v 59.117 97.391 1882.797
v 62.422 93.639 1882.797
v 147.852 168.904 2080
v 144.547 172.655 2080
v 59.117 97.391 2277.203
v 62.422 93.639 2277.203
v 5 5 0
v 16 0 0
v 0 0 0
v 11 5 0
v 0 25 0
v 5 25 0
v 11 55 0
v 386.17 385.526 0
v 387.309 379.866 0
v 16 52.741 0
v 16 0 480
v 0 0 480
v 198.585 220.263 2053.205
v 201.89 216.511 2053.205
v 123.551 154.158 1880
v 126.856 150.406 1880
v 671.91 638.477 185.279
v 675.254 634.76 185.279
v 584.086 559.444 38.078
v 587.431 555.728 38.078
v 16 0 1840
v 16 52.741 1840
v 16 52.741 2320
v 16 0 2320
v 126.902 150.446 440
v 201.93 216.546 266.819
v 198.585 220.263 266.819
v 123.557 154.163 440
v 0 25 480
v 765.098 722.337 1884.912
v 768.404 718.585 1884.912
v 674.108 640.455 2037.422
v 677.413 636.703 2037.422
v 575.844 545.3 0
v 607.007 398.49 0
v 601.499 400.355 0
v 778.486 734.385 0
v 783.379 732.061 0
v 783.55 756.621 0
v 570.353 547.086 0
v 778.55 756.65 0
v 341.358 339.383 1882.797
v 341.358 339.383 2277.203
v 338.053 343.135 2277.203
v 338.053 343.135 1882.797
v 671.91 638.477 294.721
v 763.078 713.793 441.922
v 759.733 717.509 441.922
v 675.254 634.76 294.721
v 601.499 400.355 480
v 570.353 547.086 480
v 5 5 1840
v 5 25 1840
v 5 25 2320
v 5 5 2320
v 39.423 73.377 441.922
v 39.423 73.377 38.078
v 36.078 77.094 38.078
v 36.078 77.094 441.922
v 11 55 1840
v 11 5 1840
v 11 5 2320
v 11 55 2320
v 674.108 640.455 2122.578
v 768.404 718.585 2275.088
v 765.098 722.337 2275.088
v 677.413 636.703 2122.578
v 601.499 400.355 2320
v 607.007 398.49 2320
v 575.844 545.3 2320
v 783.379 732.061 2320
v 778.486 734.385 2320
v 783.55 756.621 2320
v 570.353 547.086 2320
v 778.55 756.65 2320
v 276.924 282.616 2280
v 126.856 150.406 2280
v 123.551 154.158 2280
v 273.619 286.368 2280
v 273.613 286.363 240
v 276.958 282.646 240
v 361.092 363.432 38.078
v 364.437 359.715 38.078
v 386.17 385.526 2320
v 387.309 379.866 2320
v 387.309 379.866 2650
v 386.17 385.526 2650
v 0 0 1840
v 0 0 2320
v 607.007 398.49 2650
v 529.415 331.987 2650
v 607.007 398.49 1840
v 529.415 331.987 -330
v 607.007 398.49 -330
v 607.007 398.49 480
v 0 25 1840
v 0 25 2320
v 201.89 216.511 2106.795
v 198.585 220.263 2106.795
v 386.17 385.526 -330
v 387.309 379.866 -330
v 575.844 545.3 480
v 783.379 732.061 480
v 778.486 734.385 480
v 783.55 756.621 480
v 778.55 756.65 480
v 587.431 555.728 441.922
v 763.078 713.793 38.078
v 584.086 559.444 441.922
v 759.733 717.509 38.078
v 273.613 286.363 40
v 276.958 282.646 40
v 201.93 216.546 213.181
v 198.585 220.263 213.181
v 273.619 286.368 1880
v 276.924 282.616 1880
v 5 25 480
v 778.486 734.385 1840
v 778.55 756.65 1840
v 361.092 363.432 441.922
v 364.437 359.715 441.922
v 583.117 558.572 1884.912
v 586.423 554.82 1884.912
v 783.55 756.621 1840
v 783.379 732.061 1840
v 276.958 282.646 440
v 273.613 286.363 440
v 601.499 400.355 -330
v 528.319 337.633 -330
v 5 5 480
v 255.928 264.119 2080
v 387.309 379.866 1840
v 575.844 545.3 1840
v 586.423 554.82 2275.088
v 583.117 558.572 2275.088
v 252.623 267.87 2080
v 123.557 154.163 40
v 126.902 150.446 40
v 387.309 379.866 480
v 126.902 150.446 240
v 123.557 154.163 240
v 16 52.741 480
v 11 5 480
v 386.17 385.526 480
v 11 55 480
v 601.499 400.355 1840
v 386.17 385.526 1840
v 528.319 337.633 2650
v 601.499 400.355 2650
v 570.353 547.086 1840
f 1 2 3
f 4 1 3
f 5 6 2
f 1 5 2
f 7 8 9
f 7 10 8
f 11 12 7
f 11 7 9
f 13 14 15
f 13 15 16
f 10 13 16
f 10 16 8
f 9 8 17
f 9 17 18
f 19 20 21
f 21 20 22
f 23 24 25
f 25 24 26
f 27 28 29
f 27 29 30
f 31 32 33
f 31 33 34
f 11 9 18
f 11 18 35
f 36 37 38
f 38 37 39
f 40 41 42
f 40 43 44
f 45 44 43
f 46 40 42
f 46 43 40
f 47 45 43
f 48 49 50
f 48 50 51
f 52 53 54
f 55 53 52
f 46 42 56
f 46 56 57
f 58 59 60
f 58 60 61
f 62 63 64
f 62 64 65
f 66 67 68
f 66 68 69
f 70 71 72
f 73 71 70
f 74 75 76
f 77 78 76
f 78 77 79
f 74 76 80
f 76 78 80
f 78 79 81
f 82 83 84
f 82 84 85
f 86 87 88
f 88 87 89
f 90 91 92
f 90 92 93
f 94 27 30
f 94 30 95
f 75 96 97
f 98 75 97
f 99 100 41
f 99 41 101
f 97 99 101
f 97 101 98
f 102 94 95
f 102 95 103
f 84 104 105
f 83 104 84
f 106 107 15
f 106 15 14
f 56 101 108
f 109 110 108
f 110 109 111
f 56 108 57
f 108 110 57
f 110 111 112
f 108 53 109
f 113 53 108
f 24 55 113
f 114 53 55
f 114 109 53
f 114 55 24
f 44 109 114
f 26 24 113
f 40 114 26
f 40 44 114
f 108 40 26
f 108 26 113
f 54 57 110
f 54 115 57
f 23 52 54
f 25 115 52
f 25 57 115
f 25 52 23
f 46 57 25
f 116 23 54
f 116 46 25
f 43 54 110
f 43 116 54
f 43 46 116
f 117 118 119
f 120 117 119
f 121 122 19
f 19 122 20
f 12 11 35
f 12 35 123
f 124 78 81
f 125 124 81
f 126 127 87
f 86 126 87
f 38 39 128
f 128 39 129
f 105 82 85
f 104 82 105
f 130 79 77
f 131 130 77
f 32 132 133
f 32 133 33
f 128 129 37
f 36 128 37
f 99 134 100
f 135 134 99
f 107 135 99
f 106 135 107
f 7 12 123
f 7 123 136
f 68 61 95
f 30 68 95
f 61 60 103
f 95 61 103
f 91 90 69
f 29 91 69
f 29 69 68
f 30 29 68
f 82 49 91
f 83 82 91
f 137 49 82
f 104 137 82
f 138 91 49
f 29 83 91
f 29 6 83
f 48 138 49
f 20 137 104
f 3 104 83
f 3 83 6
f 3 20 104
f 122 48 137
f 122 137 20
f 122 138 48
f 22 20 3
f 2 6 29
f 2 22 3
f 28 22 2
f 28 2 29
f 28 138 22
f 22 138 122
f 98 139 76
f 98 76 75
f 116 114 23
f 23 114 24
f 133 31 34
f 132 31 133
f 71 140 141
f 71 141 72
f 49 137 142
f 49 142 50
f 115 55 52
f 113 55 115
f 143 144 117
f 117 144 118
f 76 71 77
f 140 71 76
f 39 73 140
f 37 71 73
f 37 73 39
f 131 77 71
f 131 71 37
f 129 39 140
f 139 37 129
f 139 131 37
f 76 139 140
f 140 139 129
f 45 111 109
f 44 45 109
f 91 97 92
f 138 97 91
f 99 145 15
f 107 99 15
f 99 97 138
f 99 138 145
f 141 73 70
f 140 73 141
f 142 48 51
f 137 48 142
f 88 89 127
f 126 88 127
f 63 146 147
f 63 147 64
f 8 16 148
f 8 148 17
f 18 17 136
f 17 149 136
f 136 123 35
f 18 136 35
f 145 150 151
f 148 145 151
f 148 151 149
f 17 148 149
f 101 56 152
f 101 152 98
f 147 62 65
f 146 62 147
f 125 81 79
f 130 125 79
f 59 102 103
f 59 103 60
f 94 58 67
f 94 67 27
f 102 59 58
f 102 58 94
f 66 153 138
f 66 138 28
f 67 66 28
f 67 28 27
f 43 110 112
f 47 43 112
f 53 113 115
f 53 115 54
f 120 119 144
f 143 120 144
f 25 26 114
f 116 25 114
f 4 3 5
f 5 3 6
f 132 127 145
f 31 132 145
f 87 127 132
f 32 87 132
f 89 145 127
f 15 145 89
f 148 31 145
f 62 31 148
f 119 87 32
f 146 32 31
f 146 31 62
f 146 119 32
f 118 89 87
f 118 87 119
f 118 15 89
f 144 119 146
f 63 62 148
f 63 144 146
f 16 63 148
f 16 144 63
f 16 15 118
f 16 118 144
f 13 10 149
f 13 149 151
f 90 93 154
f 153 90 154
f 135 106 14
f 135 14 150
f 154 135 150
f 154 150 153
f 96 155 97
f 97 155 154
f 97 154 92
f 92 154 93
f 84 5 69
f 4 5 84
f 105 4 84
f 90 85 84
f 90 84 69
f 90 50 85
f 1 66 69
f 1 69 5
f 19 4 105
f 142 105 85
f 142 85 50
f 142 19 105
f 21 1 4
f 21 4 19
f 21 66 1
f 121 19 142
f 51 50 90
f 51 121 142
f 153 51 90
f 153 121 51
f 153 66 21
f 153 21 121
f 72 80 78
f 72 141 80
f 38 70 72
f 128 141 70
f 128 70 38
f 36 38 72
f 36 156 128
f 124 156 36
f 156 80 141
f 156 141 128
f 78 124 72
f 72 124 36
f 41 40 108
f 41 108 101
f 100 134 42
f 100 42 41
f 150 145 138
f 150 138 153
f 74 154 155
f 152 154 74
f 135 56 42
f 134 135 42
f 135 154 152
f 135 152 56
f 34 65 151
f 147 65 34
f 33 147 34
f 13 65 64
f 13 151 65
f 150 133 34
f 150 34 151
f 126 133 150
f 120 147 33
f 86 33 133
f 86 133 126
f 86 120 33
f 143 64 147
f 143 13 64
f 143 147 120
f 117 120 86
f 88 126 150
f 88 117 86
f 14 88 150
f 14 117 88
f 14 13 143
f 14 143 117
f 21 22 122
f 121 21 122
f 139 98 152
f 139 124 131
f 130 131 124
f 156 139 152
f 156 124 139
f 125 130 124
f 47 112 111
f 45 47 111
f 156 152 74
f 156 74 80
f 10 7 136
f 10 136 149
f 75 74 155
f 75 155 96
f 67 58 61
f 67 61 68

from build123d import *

# Parameters (mm, degrees)
BOSS_EXTRUDE1_DEPTH      = 480
CUT_EXTRUDE3_DEPTH       = 505
CUT_EXTRUDE3_DEPTH_BACK  = 505
BOSS_EXTRUDE2_DEPTH      = 1360
BOSS_EXTRUDE2_DEPTH_BACK = 810
BOSS_EXTRUDE3_DEPTH      = 480
BOSS_EXTRUDE4_DEPTH      = 330
CUT_EXTRUDE4_DEPTH       = 330
CUT_EXTRUDE4_DEPTH_BACK  = 330


with BuildPart() as part:
    # Sketch1 → Boss-Extrude1 (new body)
    with BuildSketch(Plane.XY):
        Polygon((11, 5), (11, 55), (386.170144681, 385.525887852), (528.318811029, 337.632708219), (601.499421829, 400.354983269), (570.353242625, 547.085741874), (778.485595709, 734.384763761), (778.549738756, 756.650357197), (783.549656083, 756.621450914), (783.378536091, 732.061448595), (575.84367641, 545.300113082), (607.006700625, 398.489997031), (529.415153906, 331.987158619), (387.309357719, 379.865894301), (16, 52.741369955), (16, 0), (0, 0), (0, 25), (5, 25), (5, 5), align=None)
    extrude(amount=BOSS_EXTRUDE1_DEPTH)

    # Sketch2 → Cut-Extrude3 (cut, two sides: drawn at the far end of the back side and taken through both)
    with BuildSketch(Plane(origin=(-16.817823624, 18.688475623, 0), x_dir=(0.7433298324443945, 0.6689250781651025, 0), z_dir=(-0.6689250781651025, 0.7433298324443945, 0)).offset(-CUT_EXTRUDE3_DEPTH_BACK)):
        Polygon((194.967507456, -40), (394.939723607, -40), (294.953615531, -213.181019237), align=None)
        Polygon((394.939723607, -440), (294.953615531, -266.818980763), (194.967507456, -440), align=None)
        Polygon((78.387816928, -38.078052875), (78.387816928, -441.921947125), (194.967507456, -240), align=None)
        Polygon((511.519414135, -441.921947125), (394.939723607, -240), (511.519414135, -38.078052875), align=None)
        Polygon((808.395249794, -38.078052875), (1044.692404937, -38.078052875), (926.543827366, -185.27928203), align=None)
        Polygon((1044.692404937, -441.921947125), (926.543827366, -294.72071797), (808.395249794, -441.921947125), align=None)
    extrude(amount=CUT_EXTRUDE3_DEPTH + CUT_EXTRUDE3_DEPTH_BACK, mode=Mode.SUBTRACT)

    # Sketch3 → Boss-Extrude2 (add, two sides: drawn at the far end of the back side and taken through both)
    with BuildSketch(Plane.XY.offset(480).offset(-BOSS_EXTRUDE2_DEPTH_BACK)):
        Polygon((386.170144681, 385.525887852), (528.318811029, 337.632708219), (601.499421829, 400.354983269), (607.006700625, 398.489997031), (529.415153906, 331.987158619), (387.309357719, 379.865894301), align=None)
    extrude(amount=BOSS_EXTRUDE2_DEPTH + BOSS_EXTRUDE2_DEPTH_BACK)

    # Sketch4 → Boss-Extrude3 (add)
    with BuildSketch(Plane.XY.offset(1840)):
        Polygon((0, 25), (5, 25), (5, 5), (11, 5), (11, 55), (386.170144681, 385.525887852), (528.318811029, 337.632708219), (601.499421829, 400.354983269), (570.353242625, 547.085741874), (778.485595709, 734.384763761), (778.549738756, 756.650357197), (783.549656083, 756.621450914), (783.378536091, 732.061448595), (575.84367641, 545.300113082), (607.006700625, 398.489997031), (529.415153906, 331.987158619), (387.309357719, 379.865894301), (16, 52.741369955), (16, 0), (0, 0), align=None)
    extrude(amount=BOSS_EXTRUDE3_DEPTH)

    # Sketch5 → Boss-Extrude4 (add)
    with BuildSketch(Plane.XY.offset(2320)):
        Polygon((386.170144681, 385.525887852), (528.318811029, 337.632708219), (601.499421829, 400.354983269), (607.006700625, 398.489997031), (529.415153906, 331.987158619), (387.309357719, 379.865894301), align=None)
    extrude(amount=BOSS_EXTRUDE4_DEPTH)

    # Sketch6 → Cut-Extrude4 (cut, two sides: drawn at the far end of the back side and taken through both)
    with BuildSketch(Plane(origin=(-22.473873985, 25.509428654, 0), x_dir=(0.7503402893619813, 0.6610517757030672, 0), z_dir=(-0.6610517757030672, 0.7503402893619813, 0)).offset(-CUT_EXTRUDE4_DEPTH_BACK)):
        Polygon((194.611590847, -1880), (394.611590847, -1880), (294.611590847, -2053.205080757), align=None)
        Polygon((294.611590847, -2106.794919243), (194.611590847, -2280), (394.611590847, -2280), align=None)
        Polygon((108.738430441, -1882.796854181), (222.593719764, -2080), (108.738430441, -2277.203145819), align=None)
        Polygon((366.629461929, -2080), (480.484751253, -2277.203145819), (480.484751253, -1882.796854181), align=None)
        Polygon((806.781697185, -1884.912116982), (1051.586264598, -1884.912116982), (929.183980892, -2037.422201681), align=None)
        Polygon((806.781697185, -2275.087883018), (1051.586264598, -2275.087883018), (929.183980892, -2122.577798319), align=None)
    extrude(amount=CUT_EXTRUDE4_DEPTH + CUT_EXTRUDE4_DEPTH_BACK, mode=Mode.SUBTRACT)


solid = part.part
